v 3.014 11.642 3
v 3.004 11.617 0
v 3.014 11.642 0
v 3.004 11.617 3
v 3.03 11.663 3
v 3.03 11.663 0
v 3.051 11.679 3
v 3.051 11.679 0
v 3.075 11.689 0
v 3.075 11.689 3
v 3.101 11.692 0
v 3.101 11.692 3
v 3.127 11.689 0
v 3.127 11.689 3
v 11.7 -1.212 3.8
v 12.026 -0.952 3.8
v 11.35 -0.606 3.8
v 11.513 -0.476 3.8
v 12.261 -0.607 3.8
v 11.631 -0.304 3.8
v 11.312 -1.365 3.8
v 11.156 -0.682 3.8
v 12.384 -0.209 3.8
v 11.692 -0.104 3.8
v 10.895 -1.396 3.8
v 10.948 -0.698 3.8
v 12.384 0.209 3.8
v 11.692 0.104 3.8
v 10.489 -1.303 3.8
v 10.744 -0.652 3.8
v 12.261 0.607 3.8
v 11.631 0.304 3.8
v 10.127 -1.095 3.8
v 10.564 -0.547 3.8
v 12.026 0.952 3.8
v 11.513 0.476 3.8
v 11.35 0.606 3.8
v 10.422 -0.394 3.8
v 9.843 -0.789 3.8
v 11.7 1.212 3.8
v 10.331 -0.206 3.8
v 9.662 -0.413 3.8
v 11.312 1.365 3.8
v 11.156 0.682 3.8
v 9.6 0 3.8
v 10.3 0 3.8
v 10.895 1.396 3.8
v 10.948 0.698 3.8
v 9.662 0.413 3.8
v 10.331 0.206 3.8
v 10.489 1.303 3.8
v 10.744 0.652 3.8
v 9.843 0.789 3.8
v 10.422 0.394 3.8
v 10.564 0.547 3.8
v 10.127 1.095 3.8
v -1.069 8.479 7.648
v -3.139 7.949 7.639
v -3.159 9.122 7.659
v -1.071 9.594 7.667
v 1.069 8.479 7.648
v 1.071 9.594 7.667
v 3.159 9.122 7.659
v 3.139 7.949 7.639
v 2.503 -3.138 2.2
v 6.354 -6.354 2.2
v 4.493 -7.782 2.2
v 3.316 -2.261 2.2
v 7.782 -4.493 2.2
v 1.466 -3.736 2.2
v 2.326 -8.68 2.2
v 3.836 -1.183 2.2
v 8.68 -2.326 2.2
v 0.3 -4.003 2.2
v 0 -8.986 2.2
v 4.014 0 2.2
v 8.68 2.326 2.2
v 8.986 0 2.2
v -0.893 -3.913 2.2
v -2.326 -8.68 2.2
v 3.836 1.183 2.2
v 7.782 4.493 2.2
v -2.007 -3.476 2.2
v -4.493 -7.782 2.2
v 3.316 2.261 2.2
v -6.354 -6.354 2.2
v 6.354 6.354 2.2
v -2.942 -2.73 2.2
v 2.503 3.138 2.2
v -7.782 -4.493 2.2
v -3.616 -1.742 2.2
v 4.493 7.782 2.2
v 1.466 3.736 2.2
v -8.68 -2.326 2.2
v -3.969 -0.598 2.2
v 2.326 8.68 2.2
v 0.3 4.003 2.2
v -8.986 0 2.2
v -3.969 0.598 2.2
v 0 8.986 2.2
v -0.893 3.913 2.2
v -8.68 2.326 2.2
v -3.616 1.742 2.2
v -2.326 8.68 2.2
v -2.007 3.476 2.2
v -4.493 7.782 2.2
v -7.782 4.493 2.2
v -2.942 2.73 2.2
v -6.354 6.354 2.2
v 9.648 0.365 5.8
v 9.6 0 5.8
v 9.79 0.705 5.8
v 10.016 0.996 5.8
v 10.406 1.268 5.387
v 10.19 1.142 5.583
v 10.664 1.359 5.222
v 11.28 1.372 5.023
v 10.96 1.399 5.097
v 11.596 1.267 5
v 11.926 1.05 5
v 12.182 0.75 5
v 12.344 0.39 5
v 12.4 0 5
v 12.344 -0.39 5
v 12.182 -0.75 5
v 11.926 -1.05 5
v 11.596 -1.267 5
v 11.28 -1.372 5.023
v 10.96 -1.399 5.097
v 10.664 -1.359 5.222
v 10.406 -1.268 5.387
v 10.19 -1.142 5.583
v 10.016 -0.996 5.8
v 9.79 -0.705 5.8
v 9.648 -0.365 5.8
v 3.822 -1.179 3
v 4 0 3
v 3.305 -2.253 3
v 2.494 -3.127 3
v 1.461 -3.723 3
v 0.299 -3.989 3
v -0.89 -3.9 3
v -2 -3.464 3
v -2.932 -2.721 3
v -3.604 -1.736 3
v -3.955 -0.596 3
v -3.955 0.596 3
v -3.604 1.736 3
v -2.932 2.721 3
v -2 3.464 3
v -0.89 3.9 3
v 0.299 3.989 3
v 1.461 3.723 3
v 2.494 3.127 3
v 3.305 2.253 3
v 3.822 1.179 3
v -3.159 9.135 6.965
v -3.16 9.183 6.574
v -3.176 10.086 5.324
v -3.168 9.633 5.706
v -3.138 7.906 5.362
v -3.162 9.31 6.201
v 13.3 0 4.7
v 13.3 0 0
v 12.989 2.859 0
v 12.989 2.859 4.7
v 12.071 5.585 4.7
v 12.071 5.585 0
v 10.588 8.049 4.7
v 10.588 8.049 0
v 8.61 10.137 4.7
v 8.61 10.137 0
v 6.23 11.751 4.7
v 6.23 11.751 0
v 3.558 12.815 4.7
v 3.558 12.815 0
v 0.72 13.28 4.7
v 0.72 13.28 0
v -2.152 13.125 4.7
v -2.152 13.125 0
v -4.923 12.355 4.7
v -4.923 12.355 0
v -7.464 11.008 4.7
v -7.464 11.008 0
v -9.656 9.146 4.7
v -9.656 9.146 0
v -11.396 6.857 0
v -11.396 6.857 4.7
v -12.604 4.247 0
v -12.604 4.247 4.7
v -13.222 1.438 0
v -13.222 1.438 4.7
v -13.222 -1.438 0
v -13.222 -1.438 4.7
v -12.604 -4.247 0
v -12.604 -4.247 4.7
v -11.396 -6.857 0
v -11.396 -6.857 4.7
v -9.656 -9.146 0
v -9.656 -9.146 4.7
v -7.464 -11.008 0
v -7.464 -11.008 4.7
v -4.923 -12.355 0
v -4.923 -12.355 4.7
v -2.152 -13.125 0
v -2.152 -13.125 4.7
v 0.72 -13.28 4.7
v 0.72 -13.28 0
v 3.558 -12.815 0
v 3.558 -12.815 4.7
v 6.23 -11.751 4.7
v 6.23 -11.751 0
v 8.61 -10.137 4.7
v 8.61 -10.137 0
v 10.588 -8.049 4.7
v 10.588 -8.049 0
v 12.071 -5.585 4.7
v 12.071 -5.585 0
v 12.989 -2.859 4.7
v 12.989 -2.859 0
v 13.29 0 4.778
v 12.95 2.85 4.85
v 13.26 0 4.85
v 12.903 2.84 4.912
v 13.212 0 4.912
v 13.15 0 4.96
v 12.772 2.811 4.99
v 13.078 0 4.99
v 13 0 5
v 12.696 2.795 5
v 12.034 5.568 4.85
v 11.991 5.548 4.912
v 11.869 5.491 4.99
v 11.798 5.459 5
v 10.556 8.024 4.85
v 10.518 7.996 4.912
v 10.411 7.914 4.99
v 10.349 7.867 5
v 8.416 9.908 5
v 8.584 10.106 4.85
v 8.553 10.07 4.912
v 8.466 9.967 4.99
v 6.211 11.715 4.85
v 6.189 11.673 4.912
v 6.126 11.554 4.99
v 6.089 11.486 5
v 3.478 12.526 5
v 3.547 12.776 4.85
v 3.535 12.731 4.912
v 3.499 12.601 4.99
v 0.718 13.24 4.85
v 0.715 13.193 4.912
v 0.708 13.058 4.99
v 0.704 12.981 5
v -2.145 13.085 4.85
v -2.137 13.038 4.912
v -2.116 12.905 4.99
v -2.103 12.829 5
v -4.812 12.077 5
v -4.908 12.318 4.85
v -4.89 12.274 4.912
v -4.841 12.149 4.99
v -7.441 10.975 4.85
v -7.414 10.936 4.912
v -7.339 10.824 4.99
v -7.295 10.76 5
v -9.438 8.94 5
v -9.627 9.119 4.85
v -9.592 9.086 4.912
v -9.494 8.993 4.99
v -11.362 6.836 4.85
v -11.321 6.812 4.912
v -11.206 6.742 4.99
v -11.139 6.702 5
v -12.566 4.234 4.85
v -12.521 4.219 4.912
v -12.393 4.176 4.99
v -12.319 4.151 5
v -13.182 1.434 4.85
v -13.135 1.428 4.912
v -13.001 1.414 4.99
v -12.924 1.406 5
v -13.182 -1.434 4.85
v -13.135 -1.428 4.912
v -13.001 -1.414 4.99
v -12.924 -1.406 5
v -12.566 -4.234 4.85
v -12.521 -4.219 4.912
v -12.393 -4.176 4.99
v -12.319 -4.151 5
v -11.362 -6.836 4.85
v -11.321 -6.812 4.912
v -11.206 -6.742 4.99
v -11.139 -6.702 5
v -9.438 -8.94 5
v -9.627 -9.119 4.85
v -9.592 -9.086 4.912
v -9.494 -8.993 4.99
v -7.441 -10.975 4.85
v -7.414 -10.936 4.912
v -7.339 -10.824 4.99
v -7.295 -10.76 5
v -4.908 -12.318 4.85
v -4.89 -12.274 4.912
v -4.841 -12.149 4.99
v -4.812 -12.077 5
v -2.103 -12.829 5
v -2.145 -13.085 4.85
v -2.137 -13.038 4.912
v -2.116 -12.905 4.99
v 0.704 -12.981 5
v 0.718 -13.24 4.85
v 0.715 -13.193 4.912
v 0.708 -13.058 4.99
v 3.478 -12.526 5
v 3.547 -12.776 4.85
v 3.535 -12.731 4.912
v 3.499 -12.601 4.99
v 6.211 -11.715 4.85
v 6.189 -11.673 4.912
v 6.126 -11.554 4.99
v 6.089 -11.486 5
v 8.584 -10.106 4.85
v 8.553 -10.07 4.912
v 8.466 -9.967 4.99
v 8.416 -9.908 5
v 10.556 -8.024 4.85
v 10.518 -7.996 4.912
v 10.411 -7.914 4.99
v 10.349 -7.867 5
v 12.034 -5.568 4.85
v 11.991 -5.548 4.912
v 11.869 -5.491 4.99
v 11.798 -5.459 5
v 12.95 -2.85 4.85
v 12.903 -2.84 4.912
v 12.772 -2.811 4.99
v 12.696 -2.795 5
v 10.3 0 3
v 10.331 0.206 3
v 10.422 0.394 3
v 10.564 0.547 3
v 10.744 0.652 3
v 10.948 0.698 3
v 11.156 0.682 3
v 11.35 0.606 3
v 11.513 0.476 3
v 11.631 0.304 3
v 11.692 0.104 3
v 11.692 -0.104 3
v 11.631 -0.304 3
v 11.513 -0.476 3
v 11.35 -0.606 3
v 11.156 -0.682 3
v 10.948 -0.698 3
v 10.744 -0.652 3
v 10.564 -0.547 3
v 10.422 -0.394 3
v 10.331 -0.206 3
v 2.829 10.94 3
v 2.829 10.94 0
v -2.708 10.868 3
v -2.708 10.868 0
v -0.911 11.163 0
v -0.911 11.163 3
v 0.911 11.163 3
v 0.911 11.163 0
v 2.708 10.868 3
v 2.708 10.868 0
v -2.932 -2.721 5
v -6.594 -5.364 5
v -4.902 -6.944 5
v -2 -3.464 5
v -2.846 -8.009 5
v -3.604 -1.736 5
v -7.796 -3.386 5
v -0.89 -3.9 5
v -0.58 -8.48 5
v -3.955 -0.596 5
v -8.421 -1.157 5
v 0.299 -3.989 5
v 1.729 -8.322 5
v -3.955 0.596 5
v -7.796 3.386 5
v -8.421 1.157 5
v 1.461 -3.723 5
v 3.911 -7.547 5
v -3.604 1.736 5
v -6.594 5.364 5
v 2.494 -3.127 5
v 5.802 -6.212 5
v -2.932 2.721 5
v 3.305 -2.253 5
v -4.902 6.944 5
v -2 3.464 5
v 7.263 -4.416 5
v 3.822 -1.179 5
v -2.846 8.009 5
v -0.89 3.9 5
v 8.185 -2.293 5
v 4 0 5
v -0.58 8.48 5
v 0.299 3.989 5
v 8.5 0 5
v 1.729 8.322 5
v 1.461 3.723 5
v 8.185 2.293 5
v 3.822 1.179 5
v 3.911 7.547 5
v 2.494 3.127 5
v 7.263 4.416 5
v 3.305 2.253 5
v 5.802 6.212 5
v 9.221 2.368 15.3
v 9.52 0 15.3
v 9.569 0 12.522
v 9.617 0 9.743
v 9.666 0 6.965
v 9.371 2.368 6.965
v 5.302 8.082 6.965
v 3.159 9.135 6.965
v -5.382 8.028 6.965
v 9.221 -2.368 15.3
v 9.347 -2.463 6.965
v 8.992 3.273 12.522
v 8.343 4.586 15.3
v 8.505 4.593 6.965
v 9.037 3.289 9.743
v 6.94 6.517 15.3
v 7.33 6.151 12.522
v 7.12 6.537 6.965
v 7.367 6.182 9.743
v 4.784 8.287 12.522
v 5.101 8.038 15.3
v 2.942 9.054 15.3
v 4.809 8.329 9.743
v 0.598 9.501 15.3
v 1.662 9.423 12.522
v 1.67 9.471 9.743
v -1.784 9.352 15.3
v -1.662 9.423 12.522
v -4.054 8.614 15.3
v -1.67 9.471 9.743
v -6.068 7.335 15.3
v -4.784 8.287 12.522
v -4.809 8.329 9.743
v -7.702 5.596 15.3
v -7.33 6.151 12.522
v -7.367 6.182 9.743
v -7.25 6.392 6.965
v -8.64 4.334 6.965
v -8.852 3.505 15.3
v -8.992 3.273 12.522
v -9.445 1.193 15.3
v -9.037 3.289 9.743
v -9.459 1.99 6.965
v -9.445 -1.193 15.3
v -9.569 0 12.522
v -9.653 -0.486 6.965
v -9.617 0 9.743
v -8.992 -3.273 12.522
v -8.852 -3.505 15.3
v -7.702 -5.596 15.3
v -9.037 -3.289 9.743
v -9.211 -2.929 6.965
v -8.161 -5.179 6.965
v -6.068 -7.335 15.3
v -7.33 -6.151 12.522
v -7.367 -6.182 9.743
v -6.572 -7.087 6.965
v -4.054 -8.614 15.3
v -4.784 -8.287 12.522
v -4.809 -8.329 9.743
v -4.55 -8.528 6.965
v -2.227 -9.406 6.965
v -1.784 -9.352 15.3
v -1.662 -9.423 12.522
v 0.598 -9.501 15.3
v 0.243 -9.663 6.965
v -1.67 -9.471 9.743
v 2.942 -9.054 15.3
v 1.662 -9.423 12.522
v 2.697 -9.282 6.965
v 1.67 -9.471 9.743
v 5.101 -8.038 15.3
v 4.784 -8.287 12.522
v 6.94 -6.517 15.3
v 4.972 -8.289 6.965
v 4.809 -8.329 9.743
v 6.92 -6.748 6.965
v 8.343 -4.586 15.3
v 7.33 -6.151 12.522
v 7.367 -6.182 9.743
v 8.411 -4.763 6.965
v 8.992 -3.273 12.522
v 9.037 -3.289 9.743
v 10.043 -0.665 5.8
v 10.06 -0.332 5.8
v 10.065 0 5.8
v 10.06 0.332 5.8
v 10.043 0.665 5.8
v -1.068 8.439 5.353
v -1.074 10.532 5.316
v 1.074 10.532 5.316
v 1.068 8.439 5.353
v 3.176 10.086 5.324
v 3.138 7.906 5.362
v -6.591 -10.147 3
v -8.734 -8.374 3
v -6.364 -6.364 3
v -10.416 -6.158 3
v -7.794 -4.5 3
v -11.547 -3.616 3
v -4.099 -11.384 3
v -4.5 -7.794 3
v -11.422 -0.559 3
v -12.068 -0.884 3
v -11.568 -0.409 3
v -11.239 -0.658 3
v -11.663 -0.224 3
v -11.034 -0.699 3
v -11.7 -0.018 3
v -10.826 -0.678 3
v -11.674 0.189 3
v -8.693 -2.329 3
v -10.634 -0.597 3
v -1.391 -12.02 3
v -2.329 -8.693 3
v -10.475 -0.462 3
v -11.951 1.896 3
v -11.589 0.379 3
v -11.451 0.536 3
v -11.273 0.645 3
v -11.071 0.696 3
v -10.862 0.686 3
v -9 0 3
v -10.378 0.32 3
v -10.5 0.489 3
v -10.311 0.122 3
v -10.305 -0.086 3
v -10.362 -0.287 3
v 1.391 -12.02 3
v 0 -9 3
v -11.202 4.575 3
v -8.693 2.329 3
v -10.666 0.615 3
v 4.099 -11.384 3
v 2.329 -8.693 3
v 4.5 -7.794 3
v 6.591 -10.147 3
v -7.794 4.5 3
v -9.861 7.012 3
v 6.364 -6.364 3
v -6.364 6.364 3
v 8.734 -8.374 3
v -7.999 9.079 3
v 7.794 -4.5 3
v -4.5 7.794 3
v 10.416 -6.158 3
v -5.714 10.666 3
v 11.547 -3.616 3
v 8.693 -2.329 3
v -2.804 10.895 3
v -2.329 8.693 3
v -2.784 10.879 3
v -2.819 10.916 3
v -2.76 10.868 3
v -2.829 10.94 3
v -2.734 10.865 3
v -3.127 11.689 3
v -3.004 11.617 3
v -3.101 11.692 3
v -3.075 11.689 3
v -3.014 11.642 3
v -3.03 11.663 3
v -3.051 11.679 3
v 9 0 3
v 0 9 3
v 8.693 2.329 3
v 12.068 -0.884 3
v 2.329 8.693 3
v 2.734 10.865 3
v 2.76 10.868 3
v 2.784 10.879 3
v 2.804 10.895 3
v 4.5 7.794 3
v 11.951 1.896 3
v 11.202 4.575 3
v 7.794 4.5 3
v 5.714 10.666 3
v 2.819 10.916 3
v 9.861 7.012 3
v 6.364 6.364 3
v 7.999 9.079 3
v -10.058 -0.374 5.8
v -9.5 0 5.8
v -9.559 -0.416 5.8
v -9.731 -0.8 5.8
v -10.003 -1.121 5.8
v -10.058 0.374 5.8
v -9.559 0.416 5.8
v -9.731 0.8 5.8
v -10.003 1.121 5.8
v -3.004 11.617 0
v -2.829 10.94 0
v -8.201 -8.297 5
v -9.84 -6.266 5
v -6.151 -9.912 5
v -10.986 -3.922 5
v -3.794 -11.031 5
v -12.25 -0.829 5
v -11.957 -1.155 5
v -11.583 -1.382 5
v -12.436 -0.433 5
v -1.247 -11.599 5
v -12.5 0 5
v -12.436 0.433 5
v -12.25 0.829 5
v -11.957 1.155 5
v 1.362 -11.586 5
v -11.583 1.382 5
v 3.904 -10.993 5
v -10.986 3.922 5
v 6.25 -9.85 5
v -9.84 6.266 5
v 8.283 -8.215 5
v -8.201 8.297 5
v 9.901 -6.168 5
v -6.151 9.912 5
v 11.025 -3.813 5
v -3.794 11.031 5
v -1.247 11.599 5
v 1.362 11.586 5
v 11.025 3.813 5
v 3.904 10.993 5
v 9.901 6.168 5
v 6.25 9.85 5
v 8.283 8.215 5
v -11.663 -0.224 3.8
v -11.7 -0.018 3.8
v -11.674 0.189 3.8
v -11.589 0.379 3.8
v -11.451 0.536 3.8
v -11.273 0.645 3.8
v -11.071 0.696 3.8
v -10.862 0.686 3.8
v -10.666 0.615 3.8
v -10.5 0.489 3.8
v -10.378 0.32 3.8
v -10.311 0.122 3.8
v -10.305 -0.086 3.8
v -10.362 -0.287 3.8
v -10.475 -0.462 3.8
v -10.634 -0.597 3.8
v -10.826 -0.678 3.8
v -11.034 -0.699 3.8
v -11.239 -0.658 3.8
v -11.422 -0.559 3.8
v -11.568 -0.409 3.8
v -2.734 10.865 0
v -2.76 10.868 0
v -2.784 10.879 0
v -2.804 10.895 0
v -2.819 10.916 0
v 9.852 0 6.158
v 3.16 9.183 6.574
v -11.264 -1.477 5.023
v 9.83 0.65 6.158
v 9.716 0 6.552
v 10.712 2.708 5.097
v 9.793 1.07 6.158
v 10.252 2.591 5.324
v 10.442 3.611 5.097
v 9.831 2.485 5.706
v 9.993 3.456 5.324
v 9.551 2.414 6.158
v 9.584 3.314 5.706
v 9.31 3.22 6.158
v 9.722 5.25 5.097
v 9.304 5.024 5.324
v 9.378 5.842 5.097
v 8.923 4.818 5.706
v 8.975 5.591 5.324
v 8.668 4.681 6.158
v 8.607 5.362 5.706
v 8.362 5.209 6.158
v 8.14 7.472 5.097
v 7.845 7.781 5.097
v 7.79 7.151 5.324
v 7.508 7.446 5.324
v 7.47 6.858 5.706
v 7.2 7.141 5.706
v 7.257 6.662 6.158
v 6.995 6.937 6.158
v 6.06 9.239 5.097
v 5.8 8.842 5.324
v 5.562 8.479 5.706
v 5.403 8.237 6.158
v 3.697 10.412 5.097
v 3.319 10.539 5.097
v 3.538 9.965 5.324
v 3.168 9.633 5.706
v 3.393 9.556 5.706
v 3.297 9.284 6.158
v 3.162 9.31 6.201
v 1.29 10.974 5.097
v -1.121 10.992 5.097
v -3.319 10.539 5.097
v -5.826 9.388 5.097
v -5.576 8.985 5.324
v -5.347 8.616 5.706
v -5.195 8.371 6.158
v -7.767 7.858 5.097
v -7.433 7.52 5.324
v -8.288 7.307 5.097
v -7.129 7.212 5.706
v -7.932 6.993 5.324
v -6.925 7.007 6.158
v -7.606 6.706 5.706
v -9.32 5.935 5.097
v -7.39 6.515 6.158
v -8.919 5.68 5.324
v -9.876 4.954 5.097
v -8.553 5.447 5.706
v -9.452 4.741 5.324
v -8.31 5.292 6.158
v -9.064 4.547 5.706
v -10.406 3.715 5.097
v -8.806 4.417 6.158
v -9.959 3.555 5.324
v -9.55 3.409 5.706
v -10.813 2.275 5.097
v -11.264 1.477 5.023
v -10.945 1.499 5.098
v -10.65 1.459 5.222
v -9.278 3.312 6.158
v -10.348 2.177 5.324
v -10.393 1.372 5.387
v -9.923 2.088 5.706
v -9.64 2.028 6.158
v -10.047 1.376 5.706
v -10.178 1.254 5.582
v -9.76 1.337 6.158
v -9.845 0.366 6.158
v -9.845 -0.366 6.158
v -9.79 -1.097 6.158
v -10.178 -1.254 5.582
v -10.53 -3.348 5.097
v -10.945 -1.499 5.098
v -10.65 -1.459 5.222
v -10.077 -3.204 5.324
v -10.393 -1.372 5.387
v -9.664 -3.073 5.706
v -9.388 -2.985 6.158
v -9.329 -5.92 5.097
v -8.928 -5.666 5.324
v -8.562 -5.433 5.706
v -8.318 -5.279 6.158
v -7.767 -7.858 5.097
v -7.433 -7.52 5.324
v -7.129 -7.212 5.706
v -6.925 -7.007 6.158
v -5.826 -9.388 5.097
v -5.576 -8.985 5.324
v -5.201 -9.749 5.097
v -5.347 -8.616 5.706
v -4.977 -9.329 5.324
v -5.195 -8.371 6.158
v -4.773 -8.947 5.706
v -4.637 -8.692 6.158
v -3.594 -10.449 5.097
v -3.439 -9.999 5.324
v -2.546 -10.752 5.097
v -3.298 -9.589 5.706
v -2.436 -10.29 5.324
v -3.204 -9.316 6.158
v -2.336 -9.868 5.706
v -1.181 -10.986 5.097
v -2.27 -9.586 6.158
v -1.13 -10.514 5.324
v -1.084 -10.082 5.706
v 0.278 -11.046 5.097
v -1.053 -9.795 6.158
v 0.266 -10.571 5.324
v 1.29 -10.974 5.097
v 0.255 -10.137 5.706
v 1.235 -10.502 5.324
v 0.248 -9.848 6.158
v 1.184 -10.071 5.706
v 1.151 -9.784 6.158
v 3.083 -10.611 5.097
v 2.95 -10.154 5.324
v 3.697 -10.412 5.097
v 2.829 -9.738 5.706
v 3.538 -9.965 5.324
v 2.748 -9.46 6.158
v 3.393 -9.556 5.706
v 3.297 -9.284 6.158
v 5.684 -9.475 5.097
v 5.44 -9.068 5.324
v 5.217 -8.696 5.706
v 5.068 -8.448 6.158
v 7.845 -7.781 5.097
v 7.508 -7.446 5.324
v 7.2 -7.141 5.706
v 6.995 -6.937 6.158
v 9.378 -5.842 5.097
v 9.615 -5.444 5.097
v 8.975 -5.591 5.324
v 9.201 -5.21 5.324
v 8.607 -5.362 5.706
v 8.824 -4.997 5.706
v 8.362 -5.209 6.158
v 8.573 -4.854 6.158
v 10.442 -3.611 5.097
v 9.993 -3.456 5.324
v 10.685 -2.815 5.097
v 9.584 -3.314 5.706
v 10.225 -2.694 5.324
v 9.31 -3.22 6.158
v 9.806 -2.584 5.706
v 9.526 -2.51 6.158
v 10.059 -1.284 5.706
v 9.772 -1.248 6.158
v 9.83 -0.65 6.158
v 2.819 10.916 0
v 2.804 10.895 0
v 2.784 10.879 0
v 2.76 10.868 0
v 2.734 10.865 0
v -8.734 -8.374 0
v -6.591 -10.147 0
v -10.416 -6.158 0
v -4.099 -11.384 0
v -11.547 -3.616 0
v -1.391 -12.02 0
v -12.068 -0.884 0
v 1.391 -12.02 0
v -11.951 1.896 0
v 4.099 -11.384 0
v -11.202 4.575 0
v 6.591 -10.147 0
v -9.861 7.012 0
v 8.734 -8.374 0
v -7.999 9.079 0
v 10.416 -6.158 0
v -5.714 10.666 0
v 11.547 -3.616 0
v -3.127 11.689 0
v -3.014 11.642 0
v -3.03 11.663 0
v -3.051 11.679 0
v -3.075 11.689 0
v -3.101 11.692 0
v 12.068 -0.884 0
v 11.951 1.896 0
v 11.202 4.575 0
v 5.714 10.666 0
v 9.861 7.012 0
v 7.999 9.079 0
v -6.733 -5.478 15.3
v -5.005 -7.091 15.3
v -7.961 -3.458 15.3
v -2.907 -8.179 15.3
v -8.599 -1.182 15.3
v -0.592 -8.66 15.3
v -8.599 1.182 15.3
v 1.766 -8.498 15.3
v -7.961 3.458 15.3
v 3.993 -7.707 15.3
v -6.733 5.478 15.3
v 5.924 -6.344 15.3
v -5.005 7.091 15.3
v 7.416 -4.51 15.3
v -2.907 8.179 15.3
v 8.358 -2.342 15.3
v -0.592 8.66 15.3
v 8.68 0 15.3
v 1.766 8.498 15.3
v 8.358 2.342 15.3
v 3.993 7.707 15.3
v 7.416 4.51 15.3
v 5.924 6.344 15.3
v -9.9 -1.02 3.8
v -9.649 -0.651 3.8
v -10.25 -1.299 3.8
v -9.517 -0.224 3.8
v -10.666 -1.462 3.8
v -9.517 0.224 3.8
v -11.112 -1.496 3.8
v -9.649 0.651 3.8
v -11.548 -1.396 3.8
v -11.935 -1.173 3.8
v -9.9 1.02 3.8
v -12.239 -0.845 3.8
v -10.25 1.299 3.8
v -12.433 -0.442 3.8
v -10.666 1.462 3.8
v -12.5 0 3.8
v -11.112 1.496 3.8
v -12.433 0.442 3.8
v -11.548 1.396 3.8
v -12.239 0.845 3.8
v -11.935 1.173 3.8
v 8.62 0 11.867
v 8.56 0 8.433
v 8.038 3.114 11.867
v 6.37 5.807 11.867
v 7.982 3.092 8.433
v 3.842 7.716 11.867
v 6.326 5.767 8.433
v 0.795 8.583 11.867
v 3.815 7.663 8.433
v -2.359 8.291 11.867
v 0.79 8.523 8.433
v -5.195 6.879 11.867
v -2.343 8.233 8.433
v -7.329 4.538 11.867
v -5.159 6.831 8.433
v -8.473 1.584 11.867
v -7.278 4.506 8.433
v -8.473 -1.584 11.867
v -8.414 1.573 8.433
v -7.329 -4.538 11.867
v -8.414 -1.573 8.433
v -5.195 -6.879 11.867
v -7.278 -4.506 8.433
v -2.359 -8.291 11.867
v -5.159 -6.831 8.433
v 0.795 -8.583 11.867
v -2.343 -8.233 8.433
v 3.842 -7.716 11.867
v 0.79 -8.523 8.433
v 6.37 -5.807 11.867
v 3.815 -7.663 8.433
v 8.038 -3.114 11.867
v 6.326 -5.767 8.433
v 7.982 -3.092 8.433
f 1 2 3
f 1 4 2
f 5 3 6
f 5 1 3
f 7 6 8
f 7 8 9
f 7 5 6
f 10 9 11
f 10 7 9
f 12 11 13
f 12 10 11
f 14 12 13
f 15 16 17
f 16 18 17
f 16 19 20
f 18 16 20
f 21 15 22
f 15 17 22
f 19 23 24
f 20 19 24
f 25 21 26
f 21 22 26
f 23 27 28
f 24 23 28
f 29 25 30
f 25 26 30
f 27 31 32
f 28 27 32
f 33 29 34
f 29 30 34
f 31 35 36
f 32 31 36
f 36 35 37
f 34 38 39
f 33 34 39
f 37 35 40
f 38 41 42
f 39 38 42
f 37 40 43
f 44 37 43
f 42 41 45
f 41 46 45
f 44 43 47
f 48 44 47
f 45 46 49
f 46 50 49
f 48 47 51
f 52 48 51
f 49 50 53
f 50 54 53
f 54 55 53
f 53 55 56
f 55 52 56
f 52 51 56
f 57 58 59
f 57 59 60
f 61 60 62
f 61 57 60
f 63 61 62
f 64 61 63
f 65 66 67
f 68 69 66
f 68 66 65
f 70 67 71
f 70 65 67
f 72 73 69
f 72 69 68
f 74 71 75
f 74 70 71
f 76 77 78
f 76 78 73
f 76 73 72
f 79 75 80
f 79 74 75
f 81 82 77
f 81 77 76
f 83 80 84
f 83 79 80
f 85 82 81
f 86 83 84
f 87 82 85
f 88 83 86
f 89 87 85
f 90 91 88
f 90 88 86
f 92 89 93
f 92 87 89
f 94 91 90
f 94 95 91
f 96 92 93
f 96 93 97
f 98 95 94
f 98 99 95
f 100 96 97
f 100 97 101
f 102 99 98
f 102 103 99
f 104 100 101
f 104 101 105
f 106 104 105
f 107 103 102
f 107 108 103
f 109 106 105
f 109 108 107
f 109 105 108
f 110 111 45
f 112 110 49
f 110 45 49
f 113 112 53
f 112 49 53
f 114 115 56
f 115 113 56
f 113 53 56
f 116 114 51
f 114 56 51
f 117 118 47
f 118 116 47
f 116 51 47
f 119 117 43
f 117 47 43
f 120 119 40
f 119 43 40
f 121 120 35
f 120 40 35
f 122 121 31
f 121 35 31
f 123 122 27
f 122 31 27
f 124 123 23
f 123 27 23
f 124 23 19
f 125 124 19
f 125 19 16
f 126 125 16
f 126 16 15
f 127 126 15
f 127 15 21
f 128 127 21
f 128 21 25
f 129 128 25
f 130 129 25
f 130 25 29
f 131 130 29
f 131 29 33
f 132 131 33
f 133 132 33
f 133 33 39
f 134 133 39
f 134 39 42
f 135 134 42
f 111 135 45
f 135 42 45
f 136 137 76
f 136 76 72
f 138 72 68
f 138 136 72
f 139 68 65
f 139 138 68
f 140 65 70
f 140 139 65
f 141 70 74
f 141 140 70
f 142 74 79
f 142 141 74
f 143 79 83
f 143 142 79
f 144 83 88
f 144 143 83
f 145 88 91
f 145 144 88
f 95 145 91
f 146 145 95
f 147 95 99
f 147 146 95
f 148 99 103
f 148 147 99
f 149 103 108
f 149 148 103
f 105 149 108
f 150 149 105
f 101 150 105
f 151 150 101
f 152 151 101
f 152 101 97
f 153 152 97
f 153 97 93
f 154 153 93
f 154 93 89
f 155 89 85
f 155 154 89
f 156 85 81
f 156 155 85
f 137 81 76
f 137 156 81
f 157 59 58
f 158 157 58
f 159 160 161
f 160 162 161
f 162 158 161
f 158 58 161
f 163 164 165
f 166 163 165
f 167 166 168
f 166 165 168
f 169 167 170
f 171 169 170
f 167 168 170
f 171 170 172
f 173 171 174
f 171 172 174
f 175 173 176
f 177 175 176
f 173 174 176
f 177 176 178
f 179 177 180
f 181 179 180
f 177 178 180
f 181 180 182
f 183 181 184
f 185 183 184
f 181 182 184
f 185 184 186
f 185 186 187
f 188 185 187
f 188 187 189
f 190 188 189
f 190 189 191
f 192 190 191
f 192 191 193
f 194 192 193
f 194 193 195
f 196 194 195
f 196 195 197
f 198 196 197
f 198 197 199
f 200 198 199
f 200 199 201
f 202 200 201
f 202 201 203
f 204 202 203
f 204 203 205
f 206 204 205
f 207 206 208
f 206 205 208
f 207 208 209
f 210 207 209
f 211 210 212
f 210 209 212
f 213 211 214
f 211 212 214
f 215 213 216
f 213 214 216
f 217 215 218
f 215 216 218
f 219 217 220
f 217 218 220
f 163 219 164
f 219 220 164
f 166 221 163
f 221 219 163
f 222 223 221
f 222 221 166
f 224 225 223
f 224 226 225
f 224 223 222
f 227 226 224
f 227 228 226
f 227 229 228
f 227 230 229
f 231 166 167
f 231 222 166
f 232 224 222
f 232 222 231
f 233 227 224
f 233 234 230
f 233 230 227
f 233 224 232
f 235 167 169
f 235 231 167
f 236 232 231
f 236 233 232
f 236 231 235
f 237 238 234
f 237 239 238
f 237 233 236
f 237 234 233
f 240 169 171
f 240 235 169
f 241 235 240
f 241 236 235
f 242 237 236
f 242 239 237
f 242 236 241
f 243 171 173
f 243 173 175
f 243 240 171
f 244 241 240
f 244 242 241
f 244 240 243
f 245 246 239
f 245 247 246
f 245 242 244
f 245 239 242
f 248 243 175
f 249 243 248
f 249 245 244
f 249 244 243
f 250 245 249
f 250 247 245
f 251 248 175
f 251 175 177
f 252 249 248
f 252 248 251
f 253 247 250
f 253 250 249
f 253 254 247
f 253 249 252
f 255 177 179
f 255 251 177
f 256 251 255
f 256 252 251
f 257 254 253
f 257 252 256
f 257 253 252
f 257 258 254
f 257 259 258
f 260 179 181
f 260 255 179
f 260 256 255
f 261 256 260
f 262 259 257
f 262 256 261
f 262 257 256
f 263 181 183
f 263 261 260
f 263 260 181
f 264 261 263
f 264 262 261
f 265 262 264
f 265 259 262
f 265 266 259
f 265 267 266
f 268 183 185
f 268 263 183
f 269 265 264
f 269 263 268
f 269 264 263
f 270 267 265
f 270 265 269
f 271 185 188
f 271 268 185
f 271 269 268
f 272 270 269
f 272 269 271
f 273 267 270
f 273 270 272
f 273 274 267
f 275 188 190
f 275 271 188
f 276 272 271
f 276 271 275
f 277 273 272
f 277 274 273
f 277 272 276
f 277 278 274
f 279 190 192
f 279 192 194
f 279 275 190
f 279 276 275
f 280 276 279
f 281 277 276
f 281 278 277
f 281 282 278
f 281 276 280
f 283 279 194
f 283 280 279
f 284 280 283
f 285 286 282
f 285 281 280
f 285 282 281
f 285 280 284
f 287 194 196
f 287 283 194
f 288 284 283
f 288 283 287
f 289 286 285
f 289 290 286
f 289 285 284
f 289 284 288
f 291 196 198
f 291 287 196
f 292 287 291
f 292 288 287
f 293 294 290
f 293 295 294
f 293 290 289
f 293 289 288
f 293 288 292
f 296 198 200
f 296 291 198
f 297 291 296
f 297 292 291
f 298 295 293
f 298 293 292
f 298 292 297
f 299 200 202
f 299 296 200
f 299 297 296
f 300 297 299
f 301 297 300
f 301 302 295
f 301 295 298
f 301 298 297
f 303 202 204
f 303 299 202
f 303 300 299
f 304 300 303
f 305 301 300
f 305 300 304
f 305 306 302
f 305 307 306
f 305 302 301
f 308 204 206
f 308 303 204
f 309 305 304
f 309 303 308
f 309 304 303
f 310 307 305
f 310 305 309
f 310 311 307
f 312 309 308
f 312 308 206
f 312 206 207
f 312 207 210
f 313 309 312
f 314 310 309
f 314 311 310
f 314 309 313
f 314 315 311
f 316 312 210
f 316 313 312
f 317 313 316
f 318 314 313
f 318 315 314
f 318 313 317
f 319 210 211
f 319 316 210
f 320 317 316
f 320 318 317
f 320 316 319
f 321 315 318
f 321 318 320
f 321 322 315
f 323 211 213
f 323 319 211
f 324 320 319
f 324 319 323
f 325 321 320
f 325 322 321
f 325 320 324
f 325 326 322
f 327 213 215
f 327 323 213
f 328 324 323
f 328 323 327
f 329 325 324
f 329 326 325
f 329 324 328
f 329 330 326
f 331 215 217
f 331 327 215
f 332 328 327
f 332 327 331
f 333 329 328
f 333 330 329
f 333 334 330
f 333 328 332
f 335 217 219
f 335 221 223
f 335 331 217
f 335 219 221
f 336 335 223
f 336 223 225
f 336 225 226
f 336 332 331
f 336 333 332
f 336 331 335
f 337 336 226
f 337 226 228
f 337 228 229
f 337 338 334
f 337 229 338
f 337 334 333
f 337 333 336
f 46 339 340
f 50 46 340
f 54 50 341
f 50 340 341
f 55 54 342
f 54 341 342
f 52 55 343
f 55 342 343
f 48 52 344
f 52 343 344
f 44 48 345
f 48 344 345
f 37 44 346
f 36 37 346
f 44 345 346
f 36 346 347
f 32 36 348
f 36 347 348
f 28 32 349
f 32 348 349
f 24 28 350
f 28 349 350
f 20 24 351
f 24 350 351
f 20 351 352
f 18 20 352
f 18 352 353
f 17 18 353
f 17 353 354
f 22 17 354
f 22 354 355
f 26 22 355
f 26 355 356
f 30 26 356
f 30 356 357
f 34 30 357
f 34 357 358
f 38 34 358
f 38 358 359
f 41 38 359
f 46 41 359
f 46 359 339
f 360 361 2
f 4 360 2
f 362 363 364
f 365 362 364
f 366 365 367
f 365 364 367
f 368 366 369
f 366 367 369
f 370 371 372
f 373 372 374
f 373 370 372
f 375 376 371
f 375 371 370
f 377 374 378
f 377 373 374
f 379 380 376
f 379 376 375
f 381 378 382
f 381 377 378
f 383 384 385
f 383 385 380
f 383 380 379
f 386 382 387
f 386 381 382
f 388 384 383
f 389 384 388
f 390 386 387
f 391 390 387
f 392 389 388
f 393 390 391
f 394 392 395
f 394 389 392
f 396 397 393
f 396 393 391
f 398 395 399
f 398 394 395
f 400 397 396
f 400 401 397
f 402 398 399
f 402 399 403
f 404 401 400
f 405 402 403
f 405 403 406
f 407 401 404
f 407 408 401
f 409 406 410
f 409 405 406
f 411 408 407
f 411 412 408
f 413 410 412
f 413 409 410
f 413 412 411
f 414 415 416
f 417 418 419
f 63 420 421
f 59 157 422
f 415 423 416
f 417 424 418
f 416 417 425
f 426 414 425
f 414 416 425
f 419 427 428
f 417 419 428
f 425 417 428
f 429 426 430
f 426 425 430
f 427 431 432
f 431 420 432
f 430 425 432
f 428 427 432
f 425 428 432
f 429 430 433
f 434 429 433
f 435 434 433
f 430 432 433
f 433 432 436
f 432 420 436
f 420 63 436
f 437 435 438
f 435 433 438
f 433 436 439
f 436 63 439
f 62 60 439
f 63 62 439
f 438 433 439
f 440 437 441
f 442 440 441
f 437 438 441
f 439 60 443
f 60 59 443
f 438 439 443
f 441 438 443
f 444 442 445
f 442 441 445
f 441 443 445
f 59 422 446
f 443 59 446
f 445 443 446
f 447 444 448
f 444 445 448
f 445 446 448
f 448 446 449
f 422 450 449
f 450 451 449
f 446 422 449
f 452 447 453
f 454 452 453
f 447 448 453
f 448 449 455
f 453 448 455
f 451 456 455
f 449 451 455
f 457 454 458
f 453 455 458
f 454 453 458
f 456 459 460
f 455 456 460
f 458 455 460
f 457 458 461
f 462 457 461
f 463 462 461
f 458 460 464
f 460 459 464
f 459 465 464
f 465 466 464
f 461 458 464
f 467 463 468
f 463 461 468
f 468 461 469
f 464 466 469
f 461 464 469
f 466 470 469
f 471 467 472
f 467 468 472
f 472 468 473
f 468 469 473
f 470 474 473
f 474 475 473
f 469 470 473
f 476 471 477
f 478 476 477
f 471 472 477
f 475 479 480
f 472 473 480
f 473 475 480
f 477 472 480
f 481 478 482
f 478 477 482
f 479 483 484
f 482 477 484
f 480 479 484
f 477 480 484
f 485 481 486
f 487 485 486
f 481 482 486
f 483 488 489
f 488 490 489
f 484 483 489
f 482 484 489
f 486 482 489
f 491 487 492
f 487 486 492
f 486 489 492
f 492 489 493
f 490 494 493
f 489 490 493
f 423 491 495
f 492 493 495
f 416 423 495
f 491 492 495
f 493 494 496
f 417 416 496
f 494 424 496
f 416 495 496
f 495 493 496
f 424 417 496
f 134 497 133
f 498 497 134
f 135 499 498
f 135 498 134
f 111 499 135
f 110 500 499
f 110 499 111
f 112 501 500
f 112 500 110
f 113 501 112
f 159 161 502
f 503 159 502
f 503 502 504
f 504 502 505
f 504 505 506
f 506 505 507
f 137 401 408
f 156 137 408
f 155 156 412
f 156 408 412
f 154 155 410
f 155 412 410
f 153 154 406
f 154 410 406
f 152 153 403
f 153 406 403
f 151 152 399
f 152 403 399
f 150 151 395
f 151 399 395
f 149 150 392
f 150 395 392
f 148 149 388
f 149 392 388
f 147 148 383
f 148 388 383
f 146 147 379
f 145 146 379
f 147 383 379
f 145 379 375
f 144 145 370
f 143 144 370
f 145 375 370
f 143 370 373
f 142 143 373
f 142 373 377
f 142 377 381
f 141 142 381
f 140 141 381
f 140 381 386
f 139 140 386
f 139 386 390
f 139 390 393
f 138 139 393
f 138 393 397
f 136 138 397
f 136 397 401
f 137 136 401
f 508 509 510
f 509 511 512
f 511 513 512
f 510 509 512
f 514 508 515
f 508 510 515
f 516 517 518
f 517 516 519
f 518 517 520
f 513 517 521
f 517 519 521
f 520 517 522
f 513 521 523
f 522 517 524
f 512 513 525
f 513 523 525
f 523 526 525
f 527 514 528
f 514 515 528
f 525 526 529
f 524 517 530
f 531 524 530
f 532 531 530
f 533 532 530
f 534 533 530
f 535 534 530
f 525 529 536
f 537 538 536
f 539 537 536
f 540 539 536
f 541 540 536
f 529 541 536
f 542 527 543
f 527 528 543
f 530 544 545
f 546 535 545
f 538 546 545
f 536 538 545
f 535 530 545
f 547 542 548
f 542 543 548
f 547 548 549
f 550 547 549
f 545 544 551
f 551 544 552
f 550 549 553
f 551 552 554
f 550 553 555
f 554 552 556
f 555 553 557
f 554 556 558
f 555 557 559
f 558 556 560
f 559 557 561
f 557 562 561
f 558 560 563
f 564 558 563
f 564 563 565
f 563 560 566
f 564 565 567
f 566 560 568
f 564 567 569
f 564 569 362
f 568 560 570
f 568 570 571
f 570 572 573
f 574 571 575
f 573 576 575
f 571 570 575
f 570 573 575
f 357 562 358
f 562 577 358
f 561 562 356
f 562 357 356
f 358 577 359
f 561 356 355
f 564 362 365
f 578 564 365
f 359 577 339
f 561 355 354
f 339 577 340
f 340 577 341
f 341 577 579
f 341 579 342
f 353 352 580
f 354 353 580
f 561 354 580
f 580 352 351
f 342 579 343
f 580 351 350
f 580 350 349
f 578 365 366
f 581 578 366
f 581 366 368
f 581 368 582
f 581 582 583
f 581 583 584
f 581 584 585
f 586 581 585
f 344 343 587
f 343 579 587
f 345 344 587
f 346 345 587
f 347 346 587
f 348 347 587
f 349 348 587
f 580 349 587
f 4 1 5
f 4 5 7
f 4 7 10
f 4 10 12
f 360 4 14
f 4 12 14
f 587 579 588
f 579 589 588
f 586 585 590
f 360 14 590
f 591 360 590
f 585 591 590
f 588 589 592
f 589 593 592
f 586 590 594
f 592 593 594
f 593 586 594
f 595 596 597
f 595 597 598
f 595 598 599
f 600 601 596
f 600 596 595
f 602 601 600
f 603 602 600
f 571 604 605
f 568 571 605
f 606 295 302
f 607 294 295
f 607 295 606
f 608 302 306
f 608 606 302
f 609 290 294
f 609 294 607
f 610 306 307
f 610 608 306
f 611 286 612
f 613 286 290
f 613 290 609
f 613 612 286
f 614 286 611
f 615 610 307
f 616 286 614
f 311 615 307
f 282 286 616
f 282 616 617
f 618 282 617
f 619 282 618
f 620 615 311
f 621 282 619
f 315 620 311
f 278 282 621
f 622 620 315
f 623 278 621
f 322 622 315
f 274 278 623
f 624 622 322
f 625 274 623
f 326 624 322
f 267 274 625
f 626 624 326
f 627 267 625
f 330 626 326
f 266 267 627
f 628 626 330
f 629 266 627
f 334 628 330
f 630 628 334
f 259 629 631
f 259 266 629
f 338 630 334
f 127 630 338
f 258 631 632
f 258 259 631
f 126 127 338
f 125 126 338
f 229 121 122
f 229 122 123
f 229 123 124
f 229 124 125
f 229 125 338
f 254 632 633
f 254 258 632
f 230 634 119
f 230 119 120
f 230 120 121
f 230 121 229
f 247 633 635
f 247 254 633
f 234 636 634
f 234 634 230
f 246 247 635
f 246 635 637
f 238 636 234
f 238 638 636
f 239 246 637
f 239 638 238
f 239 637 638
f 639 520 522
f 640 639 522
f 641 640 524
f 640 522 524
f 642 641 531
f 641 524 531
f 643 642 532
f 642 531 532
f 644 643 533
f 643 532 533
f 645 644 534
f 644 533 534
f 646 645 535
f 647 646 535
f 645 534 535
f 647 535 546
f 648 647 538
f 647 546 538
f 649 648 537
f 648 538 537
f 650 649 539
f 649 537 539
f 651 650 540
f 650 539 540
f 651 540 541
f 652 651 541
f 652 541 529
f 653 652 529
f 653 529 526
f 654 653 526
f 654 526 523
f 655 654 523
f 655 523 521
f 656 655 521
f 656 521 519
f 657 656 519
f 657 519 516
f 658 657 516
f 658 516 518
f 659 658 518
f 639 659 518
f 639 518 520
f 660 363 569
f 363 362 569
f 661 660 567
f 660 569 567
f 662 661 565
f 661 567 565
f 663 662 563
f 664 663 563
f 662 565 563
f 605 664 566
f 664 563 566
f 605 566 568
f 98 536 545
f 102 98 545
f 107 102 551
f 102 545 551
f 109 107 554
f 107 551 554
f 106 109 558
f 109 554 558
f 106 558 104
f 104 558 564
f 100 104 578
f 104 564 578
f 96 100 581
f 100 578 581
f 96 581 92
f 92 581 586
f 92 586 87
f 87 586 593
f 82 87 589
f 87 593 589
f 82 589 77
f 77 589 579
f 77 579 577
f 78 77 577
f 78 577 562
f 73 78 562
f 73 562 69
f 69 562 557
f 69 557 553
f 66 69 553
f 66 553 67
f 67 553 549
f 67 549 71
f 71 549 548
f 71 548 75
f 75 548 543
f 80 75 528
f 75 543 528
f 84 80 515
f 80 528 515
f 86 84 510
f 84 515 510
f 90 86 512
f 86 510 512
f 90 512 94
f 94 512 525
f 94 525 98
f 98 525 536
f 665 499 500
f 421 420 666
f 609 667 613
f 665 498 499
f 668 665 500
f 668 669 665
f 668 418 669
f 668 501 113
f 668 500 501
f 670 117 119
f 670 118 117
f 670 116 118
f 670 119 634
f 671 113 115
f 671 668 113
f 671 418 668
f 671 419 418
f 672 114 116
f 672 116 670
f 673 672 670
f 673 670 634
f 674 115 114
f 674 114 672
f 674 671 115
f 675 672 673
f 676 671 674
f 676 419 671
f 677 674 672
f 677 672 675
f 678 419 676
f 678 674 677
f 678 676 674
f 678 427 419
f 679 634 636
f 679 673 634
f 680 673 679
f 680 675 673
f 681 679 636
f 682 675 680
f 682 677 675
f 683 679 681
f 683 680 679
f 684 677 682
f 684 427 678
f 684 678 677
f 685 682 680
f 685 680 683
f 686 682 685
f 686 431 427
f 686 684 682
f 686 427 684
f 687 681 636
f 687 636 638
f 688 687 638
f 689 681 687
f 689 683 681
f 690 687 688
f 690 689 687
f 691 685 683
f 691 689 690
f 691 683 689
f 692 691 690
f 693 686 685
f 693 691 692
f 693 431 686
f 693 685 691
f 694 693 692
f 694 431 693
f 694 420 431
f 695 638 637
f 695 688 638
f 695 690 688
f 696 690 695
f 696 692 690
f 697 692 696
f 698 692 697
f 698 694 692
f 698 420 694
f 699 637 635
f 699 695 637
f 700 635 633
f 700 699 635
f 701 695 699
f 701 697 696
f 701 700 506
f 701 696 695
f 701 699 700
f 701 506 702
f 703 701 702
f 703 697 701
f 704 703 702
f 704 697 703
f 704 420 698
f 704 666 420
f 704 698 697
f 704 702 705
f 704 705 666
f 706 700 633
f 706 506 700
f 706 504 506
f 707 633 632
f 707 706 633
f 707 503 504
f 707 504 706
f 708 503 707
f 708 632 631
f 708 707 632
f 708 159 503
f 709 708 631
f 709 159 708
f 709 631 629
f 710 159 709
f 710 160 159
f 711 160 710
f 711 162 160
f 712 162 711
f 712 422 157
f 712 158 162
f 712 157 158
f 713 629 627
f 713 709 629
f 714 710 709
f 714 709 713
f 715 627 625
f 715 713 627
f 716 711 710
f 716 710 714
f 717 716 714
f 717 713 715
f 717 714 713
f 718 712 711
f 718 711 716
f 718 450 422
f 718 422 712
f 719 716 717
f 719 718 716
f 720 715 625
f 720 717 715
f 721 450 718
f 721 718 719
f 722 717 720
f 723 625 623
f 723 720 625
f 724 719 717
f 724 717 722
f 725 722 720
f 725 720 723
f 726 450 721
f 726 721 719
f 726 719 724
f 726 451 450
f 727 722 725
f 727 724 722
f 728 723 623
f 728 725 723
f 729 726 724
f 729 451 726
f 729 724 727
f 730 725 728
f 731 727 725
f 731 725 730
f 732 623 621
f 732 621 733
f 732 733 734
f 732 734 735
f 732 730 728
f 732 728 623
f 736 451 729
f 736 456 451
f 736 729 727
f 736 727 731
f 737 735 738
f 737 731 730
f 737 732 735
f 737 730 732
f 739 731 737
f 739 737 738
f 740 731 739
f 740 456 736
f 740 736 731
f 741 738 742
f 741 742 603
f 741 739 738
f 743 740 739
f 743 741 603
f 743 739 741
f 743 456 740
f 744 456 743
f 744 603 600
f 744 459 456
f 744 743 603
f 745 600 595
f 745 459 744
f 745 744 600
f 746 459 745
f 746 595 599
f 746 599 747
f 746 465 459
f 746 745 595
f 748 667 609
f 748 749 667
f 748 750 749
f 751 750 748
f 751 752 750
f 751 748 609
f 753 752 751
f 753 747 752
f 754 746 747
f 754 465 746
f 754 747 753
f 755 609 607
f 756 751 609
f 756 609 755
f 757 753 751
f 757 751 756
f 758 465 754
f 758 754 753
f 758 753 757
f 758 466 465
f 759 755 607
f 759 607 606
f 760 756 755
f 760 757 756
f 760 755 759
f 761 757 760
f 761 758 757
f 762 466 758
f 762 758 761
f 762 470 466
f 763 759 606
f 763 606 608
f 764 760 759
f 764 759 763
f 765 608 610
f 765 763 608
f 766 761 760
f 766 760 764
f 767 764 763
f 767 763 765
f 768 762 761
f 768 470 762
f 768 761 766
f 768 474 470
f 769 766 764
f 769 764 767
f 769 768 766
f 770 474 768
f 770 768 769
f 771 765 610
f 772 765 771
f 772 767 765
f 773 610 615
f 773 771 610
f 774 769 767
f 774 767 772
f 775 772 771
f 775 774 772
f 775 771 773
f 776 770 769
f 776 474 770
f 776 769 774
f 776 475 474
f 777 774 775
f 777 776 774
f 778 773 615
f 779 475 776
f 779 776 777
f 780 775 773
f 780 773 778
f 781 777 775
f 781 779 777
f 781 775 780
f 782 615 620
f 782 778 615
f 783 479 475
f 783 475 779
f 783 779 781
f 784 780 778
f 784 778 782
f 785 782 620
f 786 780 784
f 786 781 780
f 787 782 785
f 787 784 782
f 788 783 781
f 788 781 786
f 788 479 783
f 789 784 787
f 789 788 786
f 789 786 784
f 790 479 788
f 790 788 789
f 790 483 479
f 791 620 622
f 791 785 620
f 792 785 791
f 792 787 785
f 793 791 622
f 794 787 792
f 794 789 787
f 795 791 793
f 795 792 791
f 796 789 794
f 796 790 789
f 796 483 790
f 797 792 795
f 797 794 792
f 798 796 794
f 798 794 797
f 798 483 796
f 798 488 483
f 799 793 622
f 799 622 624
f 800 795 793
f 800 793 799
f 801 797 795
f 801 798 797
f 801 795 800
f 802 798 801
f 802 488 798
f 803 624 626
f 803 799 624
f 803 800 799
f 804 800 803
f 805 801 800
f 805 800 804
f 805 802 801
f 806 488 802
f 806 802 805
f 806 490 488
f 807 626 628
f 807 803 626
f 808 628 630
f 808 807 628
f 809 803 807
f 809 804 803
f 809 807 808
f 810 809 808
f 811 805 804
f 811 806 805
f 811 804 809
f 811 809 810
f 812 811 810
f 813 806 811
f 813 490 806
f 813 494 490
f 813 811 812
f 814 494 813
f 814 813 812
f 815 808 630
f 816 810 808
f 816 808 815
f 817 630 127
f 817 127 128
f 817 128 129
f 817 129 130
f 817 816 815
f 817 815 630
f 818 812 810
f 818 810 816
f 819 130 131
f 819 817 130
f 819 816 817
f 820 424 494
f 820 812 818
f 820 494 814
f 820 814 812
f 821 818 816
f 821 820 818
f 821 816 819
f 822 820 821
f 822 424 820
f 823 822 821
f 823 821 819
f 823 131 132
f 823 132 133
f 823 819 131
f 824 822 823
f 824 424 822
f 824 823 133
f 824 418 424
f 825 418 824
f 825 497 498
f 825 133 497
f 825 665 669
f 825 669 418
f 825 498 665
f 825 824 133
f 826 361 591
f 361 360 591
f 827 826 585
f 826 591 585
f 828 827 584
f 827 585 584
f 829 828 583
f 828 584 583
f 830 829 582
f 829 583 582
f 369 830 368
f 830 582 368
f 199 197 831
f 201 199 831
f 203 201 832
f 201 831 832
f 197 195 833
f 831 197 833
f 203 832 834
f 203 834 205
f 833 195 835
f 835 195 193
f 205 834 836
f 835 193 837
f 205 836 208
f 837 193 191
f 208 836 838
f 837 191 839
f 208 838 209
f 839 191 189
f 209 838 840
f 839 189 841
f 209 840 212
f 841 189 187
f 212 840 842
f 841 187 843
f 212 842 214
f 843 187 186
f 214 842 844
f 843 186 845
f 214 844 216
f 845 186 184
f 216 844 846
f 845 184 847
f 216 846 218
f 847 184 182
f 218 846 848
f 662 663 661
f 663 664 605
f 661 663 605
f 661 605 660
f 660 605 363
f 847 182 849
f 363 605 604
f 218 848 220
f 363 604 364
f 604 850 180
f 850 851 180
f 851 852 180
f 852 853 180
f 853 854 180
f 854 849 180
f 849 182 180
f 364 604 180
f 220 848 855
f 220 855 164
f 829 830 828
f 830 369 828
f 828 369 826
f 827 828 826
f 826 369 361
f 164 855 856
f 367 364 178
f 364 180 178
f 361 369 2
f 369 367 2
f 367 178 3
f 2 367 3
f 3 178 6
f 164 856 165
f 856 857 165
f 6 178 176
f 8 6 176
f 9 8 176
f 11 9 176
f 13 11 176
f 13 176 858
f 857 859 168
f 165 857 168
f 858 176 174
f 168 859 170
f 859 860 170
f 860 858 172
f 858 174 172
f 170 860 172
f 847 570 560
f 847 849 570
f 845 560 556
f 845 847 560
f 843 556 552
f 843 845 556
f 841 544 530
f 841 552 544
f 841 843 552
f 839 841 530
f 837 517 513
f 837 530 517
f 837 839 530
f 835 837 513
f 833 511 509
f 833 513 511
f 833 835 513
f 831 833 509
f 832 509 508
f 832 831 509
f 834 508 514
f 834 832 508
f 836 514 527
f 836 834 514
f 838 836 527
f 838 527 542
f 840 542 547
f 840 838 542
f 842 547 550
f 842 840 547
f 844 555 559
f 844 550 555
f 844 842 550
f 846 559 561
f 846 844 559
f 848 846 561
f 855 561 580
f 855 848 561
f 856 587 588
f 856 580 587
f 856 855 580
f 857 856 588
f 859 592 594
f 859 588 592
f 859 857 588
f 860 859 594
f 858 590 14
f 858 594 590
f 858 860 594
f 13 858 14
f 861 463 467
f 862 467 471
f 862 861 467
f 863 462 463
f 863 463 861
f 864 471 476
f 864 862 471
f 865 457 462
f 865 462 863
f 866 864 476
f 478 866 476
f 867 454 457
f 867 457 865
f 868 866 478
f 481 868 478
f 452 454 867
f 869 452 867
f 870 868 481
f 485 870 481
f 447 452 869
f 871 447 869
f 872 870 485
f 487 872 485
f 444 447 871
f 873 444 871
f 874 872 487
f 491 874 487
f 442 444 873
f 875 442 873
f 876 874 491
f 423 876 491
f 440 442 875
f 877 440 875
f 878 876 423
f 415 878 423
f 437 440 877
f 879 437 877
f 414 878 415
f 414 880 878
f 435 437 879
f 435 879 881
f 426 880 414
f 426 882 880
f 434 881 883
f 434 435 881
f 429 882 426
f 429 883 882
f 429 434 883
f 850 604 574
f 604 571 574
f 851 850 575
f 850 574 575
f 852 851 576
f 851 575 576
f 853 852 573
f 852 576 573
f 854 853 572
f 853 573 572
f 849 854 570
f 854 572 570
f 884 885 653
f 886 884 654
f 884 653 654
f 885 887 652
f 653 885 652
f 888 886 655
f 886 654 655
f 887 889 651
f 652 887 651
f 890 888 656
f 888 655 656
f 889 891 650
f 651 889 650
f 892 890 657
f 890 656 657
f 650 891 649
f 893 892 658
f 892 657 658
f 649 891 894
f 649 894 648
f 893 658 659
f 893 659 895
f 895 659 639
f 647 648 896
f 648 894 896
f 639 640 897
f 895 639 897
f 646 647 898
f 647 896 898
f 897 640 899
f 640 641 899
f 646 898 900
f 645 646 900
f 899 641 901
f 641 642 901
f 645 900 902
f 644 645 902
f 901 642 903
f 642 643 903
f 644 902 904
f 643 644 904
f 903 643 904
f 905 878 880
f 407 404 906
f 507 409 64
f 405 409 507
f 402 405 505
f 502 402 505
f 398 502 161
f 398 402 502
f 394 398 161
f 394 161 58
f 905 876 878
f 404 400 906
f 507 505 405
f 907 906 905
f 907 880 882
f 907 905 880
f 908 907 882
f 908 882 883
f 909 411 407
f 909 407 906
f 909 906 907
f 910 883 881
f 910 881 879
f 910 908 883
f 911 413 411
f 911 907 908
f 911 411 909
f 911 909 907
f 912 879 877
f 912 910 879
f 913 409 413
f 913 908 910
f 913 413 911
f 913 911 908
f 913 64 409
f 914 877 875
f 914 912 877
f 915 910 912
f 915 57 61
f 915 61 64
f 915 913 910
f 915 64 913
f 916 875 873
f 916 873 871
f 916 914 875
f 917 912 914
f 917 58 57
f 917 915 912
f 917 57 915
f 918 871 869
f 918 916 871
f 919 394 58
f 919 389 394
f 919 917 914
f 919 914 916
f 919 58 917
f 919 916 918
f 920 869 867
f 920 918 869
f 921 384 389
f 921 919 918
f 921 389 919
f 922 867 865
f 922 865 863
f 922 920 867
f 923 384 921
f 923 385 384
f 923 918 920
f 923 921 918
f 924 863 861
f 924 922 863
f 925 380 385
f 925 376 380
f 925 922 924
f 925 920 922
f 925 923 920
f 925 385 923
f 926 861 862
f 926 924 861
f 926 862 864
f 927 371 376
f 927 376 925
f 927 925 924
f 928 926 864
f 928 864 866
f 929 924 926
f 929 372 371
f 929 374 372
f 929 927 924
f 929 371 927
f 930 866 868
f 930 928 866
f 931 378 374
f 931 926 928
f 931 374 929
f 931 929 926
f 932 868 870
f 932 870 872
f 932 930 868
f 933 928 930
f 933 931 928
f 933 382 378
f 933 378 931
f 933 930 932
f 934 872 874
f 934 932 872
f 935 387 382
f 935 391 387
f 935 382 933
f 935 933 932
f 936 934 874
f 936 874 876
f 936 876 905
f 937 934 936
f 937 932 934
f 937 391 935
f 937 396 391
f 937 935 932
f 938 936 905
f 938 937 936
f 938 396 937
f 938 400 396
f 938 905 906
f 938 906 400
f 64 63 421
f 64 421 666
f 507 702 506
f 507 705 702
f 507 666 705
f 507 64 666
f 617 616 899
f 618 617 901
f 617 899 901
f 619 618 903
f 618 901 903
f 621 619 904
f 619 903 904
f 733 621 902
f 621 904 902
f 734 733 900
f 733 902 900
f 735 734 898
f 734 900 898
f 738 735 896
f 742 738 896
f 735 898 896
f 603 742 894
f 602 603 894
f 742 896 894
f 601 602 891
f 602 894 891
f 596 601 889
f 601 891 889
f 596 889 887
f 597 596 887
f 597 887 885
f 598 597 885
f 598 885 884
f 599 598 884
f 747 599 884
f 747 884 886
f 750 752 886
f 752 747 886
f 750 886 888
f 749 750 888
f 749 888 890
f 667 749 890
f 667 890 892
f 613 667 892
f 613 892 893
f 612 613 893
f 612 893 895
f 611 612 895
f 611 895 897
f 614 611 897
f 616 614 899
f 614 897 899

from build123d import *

# Parameters (mm, degrees)
SKETCH1_R           = 13.3
SKETCH1_R_2         = 12.1
BOSS_EXTRUDE1_DEPTH = 3
SKETCH2_R           = 13.3
BOSS_EXTRUDE2_DEPTH = 2
SKETCH3_R           = 4
CUT_EXTRUDE1_DEPTH  = 10.2
SKETCH4_R           = 9.7
SKETCH4_R_2         = 8.5
BOSS_EXTRUDE3_DEPTH = 10.3
BOSS_EXTRUDE3_DRAFT = 1
FILLET1_R           = 2
SKETCH5_R           = 9
SKETCH5_R_2         = 4
BOSS_EXTRUDE4_DEPTH = 0.8
BOSS_EXTRUDE4_DRAFT = 1
BOSS_EXTRUDE5_DEPTH = 3
FILLET2_R           = 0.1
SKETCH7_W           = 6
SKETCH7_H           = 2
CUT_EXTRUDE2_DEPTH  = 20.8
CUT_EXTRUDE2_DRAFT  = -1
SKETCH8_R           = 0.7
CUT_EXTRUDE3_DEPTH  = 20.8
CUT_EXTRUDE4_START  = -0.8
SKETCH9_R           = 1.4
SKETCH9_R_2         = 1.5
CUT_EXTRUDE4_DEPTH  = 2
FILLET3_R           = 0.3


with BuildPart() as part:
    # Sketch1 → Boss-Extrude1 (new body)
    with BuildSketch(Plane.XY):
        Circle(SKETCH1_R)
        Circle(SKETCH1_R_2, mode=Mode.SUBTRACT)
    extrude(amount=BOSS_EXTRUDE1_DEPTH)

    # Sketch2 → Boss-Extrude2 (add)
    with BuildSketch(Plane.XY.offset(3)):
        Circle(SKETCH2_R)
    extrude(amount=BOSS_EXTRUDE2_DEPTH)

    # Sketch3 → Cut-Extrude1 (cut)
    with BuildSketch(Plane.XY.offset(5)):
        Circle(SKETCH3_R)
    extrude(amount=-CUT_EXTRUDE1_DEPTH, mode=Mode.SUBTRACT)


with BuildPart() as boss_extrude3_tool:
    # Sketch4 → Boss-Extrude3 (with draft: the straight prism first)
    with BuildSketch(Plane.XY.offset(5)):
        Circle(SKETCH4_R)
        Circle(SKETCH4_R_2, mode=Mode.SUBTRACT)
    extrude(amount=BOSS_EXTRUDE3_DEPTH)
    # Boss-Extrude3: the draft: its side faces are tilted about the plane it starts from
    boss_extrude3_sides = [boss_extrude3_tool.faces().sort_by_distance(p)[0] for p in [
        (-9.7, 0, 10.15),
        (-8.5, 0, 10.15),
    ]]
    draft(boss_extrude3_sides, Plane.XY.offset(5), BOSS_EXTRUDE3_DRAFT)


with BuildPart() as part_1:
    add(part.part)

    # Boss-Extrude3: add boss_extrude3_tool
    add(boss_extrude3_tool.part)

    # Fillet1
    fillet1_edges = [part_1.edges().sort_by_distance(p)[0] for p in [
        (-9.7, 0, 5),
    ]]
    fillet(fillet1_edges, radius=FILLET1_R)


with BuildPart() as boss_extrude4_tool:
    # Sketch5 → Boss-Extrude4 (with draft: the straight prism first)
    with BuildSketch(Plane(origin=(0, 0, 3), x_dir=(-1, 0, 0), z_dir=(0, 0, -1))):
        Circle(SKETCH5_R)
        with Locations(Location((0, 0, 0), (0, 0, 180))):
            Circle(SKETCH5_R_2, mode=Mode.SUBTRACT)
    extrude(amount=BOSS_EXTRUDE4_DEPTH)
    # Boss-Extrude4: the draft: its side faces are tilted about the plane it starts from
    boss_extrude4_sides = [boss_extrude4_tool.faces().sort_by_distance(p)[0] for p in [
        (9, 0, 2.6),
        (-4, 0, 2.6),
    ]]
    draft(boss_extrude4_sides, Plane(origin=(0, 0, 3), x_dir=(-1, 0, 0), z_dir=(0, 0, -1)), BOSS_EXTRUDE4_DRAFT)


with BuildPart() as part_2:
    add(part_1.part)

    # Boss-Extrude4: add boss_extrude4_tool
    add(boss_extrude4_tool.part)

    # Sketch6 → Boss-Extrude5 (add)
    with BuildSketch(Plane(origin=(0, 0, 0), x_dir=(-1, 0, 0), z_dir=(0, 0, -1))):
        with BuildLine():
            Line((3.029598049, 11.714586449), (2.804256045, 10.843253572))
            ThreePointArc((2.804256045, 10.843253572), (0, 11.2), (-2.804256045, 10.843253572))
            Line((-2.804256045, 10.843253572), (-3.029598049, 11.714586449))
            ThreePointArc((-3.029598049, 11.714586449), (0, 12.1), (3.029598049, 11.714586449))
        make_face()
    extrude(amount=-BOSS_EXTRUDE5_DEPTH)

    # Fillet2
    fillet2_edges = [part_2.edges().sort_by_distance(p)[0] for p in [
        (-3.029598049, 11.714586449, 1.5),
        (3.029598049, 11.714586449, 1.5),
        (2.804256045, 10.843253572, 1.5),
        (-2.804256045, 10.843253572, 1.5),
    ]]
    fillet(fillet2_edges, radius=FILLET2_R)


with BuildPart() as cut_extrude2_tool:
    # Sketch7 → Cut-Extrude2 (with draft: the straight prism first)
    with BuildSketch(Plane(origin=(0, 0, 0), x_dir=(1, 0, 0), z_dir=(0, 1, 0))):
        with Locations((0, -6.5)):
            Rectangle(SKETCH7_W, SKETCH7_H)
    extrude(amount=CUT_EXTRUDE2_DEPTH)
    # Cut-Extrude2: the draft: its side faces are tilted about the plane it starts from
    cut_extrude2_sides = [cut_extrude2_tool.faces().sort_by_distance(p)[0] for p in [
        (0, 10.4, 7.5),
        (3, 10.4, 6.5),
        (0, 10.4, 5.5),
        (-3, 10.4, 6.5),
    ]]
    draft(cut_extrude2_sides, Plane(origin=(0, 0, 0), x_dir=(1, 0, 0), z_dir=(0, 1, 0)), CUT_EXTRUDE2_DRAFT)


with BuildPart() as part_3:
    add(part_2.part)

    # Cut-Extrude2: cut by cut_extrude2_tool
    add(cut_extrude2_tool.part, mode=Mode.SUBTRACT)

    # Sketch8 → Cut-Extrude3 (cut)
    with BuildSketch(Plane(origin=(0, 0, 3), x_dir=(-1, 0, 0), z_dir=(0, 0, -1))):
        with Locations((-11, 0)):
            Circle(SKETCH8_R)
        with Locations(Location((11, 0, 0), (0, 0, 341.351023891))):
            Circle(SKETCH8_R)
    extrude(amount=-CUT_EXTRUDE3_DEPTH, mode=Mode.SUBTRACT)

    # Sketch9 → Cut-Extrude4 (cut)
    with BuildSketch(Plane(origin=(0, 0, 3), x_dir=(-1, 0, 0), z_dir=(0, 0, -1)).offset(CUT_EXTRUDE4_START)):
        with Locations((-11, 0)):
            Circle(SKETCH9_R)
        with Locations((11, 0)):
            Circle(SKETCH9_R_2)
    extrude(amount=-CUT_EXTRUDE4_DEPTH, mode=Mode.SUBTRACT)

    # Fillet3
    fillet3_edges = [part_3.edges().sort_by_distance(p)[0] for p in [
        (-13.3, 0, 5),
    ]]
    fillet(fillet3_edges, radius=FILLET3_R)


solid = part_3.part
